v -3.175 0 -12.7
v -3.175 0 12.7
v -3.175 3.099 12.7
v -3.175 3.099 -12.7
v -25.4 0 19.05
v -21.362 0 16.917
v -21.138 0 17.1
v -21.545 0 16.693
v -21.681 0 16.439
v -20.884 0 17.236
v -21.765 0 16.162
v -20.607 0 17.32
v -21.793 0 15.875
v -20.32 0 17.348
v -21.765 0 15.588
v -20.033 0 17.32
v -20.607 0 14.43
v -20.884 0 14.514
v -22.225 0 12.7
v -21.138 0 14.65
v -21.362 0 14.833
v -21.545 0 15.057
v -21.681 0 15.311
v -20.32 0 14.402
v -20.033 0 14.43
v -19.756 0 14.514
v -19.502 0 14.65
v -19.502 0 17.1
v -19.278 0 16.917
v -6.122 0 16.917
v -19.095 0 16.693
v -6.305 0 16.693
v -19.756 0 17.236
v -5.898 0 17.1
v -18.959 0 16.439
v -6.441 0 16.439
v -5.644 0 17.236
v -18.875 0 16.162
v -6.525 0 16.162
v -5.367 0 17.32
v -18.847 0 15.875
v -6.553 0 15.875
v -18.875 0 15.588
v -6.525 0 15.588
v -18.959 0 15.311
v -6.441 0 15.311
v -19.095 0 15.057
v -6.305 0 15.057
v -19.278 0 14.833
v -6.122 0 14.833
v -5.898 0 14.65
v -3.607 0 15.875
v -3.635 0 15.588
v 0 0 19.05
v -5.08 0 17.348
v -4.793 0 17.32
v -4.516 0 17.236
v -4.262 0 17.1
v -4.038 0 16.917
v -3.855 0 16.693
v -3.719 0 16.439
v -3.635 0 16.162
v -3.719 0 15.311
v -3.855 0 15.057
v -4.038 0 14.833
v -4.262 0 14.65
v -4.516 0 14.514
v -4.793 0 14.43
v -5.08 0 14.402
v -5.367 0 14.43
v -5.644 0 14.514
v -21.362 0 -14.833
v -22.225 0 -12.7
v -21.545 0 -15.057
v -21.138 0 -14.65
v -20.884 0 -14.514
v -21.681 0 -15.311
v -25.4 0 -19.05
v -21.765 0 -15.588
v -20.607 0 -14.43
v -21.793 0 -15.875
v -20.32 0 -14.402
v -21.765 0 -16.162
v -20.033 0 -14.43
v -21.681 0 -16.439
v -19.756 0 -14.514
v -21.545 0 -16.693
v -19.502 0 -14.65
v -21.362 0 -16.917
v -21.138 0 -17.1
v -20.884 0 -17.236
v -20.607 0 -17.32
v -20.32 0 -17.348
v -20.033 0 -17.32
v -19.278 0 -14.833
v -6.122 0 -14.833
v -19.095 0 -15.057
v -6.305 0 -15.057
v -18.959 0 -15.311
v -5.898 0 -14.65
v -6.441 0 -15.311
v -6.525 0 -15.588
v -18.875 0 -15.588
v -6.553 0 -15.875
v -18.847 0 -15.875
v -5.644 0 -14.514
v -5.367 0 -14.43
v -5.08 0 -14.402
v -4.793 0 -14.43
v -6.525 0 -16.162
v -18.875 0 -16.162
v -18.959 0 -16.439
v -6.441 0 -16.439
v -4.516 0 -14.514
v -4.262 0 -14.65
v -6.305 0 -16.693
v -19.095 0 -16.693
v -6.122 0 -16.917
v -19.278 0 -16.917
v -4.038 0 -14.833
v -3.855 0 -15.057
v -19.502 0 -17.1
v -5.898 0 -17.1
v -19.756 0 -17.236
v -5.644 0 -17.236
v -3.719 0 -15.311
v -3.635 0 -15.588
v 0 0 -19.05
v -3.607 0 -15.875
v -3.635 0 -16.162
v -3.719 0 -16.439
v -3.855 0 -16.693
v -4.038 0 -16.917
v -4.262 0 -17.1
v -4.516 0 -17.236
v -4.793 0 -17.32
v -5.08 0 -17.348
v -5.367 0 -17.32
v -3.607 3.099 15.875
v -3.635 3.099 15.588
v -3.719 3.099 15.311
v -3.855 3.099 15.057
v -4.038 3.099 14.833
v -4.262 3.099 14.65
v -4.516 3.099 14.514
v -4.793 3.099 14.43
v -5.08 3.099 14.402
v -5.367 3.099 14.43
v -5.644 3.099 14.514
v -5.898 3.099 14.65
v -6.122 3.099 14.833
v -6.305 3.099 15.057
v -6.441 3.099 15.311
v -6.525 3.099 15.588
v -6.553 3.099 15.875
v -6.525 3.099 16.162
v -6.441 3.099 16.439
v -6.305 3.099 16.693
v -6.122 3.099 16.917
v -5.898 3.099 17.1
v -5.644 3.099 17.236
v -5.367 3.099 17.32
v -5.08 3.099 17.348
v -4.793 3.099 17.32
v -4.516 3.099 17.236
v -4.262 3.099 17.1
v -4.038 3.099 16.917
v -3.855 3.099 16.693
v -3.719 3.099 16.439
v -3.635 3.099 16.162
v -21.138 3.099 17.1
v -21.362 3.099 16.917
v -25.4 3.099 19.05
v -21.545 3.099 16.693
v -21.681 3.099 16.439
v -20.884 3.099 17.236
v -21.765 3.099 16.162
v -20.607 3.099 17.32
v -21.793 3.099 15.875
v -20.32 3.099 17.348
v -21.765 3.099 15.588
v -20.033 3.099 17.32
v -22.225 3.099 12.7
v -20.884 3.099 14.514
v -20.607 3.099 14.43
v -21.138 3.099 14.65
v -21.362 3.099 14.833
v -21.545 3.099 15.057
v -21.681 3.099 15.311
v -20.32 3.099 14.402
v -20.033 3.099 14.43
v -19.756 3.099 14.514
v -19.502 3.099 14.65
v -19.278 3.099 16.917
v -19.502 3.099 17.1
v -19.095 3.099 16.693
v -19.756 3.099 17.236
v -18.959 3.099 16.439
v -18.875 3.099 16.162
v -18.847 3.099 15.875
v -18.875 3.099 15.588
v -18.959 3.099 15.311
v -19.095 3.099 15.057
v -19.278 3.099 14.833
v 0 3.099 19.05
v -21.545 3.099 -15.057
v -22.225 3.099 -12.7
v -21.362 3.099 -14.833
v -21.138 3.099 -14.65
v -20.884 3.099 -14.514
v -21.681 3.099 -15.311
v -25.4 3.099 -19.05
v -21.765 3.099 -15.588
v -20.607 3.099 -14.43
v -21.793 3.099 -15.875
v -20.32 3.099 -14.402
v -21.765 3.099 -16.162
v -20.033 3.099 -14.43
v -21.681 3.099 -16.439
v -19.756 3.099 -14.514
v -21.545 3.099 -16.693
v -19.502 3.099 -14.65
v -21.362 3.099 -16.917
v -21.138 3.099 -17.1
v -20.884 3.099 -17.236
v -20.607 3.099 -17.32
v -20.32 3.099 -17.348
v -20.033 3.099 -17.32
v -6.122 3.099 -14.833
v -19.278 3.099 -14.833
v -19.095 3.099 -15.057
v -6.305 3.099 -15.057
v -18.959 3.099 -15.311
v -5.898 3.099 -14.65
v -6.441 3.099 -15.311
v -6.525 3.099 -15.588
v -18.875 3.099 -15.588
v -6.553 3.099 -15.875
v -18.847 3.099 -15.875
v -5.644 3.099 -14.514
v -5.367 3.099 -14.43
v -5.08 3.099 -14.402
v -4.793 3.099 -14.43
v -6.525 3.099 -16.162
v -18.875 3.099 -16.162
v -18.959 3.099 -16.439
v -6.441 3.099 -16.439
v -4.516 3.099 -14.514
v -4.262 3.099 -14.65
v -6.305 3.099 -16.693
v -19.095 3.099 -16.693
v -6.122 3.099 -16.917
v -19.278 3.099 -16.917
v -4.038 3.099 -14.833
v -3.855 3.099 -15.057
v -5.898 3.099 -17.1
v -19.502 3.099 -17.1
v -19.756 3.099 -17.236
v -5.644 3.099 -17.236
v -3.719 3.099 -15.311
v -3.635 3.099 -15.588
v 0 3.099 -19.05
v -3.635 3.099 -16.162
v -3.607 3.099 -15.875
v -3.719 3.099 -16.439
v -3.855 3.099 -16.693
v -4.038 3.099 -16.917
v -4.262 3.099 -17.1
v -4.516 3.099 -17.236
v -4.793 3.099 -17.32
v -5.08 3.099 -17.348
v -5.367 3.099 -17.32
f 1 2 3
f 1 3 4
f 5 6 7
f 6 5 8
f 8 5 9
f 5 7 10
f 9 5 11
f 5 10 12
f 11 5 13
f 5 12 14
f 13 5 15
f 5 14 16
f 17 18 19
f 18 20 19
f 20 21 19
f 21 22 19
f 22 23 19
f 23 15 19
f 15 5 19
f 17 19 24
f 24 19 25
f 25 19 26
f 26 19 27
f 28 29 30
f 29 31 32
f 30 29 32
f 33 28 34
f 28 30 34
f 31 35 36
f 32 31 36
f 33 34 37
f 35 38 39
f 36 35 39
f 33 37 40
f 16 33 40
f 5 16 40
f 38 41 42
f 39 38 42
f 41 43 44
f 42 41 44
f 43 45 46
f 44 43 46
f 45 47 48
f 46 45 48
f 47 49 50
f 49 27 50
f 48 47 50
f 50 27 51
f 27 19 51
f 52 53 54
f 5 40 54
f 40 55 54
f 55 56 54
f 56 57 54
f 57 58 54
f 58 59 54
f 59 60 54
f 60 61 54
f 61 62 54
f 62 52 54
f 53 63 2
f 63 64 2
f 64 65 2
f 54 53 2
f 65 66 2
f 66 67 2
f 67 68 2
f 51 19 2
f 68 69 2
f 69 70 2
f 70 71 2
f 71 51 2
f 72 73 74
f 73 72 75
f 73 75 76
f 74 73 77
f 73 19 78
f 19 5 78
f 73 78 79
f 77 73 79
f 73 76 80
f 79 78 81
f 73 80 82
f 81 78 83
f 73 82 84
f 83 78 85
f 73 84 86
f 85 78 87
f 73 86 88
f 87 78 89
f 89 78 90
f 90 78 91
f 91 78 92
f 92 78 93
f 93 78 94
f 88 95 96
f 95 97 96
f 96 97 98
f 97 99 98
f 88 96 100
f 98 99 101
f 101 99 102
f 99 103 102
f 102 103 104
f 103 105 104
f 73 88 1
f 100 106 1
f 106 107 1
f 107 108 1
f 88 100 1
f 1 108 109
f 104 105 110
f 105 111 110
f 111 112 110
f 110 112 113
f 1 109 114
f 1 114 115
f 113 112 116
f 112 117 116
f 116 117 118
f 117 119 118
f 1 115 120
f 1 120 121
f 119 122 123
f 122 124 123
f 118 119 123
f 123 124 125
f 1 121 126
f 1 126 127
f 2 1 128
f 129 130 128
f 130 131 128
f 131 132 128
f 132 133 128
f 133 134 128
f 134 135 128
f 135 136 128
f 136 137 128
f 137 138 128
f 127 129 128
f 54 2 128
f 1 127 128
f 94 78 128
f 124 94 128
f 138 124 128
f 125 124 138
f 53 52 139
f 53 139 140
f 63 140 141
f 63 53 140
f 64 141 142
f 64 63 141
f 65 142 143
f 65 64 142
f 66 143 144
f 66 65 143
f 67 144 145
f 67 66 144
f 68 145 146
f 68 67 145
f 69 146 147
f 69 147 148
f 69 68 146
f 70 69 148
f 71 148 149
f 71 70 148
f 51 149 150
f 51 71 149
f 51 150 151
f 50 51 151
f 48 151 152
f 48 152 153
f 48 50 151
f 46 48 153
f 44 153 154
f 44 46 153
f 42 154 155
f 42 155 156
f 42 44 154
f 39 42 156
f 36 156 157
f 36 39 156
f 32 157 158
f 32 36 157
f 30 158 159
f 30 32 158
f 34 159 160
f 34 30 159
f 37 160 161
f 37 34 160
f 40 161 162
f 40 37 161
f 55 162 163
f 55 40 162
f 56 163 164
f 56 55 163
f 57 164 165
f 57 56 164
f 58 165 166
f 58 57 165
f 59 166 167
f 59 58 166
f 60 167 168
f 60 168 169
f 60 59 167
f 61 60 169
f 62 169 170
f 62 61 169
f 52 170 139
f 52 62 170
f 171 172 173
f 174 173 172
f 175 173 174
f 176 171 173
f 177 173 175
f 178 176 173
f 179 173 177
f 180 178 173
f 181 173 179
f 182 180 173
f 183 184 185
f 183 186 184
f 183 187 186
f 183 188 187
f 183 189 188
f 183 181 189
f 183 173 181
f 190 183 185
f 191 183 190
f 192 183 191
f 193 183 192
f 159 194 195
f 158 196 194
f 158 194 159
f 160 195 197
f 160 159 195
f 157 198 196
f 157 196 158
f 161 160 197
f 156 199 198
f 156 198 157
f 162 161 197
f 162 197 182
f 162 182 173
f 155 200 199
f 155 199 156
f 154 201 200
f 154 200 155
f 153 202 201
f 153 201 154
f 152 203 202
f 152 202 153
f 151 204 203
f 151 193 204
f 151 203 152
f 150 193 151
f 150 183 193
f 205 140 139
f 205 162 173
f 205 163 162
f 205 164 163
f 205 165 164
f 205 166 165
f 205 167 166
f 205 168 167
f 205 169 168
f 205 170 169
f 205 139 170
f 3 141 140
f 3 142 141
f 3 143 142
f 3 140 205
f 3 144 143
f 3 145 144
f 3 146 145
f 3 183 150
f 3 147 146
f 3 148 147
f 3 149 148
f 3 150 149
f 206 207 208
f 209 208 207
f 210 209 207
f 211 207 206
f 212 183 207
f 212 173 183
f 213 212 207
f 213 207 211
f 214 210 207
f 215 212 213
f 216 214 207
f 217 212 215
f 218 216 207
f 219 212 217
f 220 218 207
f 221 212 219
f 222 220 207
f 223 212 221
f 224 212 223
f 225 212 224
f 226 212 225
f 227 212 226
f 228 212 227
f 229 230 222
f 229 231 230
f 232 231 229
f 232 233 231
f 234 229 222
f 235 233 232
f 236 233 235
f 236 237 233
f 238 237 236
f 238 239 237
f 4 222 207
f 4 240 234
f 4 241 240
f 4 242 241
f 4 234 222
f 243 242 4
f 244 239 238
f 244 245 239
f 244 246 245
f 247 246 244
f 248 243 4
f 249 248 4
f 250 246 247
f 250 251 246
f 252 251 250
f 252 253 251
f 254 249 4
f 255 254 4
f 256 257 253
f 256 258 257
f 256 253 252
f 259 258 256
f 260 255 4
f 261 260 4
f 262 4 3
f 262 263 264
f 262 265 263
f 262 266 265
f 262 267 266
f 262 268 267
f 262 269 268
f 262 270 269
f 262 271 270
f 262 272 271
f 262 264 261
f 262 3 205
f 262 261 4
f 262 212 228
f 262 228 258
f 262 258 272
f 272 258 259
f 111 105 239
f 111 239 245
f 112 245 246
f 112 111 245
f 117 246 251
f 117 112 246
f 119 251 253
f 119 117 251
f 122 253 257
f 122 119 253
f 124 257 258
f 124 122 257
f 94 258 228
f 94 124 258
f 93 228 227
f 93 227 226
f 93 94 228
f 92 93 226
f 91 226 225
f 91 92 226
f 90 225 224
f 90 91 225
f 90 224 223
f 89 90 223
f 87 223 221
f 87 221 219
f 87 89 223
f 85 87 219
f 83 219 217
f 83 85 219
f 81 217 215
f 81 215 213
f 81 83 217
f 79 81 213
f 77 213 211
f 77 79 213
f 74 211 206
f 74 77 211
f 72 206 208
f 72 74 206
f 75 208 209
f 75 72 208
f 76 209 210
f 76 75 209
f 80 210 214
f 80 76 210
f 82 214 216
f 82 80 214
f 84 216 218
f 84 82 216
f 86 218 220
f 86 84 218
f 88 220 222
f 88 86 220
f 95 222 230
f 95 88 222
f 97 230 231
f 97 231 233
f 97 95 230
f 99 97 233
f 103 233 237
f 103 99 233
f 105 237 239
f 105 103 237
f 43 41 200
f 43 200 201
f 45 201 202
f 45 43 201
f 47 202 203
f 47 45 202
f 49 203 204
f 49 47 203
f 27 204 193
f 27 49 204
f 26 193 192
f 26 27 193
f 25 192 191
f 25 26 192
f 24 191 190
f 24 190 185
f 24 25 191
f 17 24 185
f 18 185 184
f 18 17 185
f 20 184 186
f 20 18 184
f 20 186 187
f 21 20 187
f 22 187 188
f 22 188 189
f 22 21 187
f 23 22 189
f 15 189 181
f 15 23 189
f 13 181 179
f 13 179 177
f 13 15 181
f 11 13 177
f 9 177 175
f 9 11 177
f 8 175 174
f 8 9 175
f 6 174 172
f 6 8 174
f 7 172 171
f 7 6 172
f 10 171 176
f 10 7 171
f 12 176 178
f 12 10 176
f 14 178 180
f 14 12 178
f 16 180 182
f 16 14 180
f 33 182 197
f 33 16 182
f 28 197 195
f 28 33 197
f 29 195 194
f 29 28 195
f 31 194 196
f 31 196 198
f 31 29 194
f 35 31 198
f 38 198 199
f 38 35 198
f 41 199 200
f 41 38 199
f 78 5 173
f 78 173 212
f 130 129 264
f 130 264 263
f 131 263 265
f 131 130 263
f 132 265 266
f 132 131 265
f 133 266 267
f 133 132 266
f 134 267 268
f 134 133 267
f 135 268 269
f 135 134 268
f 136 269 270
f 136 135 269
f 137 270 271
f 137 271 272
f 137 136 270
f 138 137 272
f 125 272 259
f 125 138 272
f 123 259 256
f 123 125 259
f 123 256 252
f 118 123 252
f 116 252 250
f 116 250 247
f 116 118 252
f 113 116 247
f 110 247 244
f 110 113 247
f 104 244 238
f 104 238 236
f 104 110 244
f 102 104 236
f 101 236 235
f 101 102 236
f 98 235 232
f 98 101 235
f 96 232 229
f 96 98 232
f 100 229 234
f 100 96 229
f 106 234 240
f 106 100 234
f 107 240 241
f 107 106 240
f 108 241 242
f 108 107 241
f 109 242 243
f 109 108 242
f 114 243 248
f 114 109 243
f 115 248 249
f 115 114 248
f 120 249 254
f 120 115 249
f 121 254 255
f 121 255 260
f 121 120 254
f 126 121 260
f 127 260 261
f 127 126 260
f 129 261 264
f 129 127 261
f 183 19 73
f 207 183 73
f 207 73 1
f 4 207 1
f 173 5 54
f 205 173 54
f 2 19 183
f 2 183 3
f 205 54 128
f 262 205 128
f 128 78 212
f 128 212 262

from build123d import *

# Parameters (mm, degrees)
SKETCH1_W           = 25.4
SKETCH1_H           = 38.1
SKETCH1_R           = 1.4732
SKETCH1_W_2         = 19.05
SKETCH1_H_2         = 25.4
BOSS_EXTRUDE1_DEPTH = 3.0988


with BuildPart() as part:
    # Sketch1 → Boss-Extrude1 (new body)
    with BuildSketch(Plane(origin=(0, 0, 0), x_dir=(1, 0, 0), z_dir=(0, 1, 0))):
        with Locations((-12.7, 0)):
            Rectangle(SKETCH1_W, SKETCH1_H)
        with Locations((-5.08, 15.875)):
            Circle(SKETCH1_R, mode=Mode.SUBTRACT)
        with Locations((-20.32, -15.875)):
            Circle(SKETCH1_R, mode=Mode.SUBTRACT)
        with Locations((-20.32, 15.875)):
            Circle(SKETCH1_R, mode=Mode.SUBTRACT)
        with Locations((-5.08, -15.875)):
            Circle(SKETCH1_R, mode=Mode.SUBTRACT)
        with Locations((-12.7, 0)):
            Rectangle(SKETCH1_W_2, SKETCH1_H_2, mode=Mode.SUBTRACT)
    extrude(amount=BOSS_EXTRUDE1_DEPTH)


solid = part.part
